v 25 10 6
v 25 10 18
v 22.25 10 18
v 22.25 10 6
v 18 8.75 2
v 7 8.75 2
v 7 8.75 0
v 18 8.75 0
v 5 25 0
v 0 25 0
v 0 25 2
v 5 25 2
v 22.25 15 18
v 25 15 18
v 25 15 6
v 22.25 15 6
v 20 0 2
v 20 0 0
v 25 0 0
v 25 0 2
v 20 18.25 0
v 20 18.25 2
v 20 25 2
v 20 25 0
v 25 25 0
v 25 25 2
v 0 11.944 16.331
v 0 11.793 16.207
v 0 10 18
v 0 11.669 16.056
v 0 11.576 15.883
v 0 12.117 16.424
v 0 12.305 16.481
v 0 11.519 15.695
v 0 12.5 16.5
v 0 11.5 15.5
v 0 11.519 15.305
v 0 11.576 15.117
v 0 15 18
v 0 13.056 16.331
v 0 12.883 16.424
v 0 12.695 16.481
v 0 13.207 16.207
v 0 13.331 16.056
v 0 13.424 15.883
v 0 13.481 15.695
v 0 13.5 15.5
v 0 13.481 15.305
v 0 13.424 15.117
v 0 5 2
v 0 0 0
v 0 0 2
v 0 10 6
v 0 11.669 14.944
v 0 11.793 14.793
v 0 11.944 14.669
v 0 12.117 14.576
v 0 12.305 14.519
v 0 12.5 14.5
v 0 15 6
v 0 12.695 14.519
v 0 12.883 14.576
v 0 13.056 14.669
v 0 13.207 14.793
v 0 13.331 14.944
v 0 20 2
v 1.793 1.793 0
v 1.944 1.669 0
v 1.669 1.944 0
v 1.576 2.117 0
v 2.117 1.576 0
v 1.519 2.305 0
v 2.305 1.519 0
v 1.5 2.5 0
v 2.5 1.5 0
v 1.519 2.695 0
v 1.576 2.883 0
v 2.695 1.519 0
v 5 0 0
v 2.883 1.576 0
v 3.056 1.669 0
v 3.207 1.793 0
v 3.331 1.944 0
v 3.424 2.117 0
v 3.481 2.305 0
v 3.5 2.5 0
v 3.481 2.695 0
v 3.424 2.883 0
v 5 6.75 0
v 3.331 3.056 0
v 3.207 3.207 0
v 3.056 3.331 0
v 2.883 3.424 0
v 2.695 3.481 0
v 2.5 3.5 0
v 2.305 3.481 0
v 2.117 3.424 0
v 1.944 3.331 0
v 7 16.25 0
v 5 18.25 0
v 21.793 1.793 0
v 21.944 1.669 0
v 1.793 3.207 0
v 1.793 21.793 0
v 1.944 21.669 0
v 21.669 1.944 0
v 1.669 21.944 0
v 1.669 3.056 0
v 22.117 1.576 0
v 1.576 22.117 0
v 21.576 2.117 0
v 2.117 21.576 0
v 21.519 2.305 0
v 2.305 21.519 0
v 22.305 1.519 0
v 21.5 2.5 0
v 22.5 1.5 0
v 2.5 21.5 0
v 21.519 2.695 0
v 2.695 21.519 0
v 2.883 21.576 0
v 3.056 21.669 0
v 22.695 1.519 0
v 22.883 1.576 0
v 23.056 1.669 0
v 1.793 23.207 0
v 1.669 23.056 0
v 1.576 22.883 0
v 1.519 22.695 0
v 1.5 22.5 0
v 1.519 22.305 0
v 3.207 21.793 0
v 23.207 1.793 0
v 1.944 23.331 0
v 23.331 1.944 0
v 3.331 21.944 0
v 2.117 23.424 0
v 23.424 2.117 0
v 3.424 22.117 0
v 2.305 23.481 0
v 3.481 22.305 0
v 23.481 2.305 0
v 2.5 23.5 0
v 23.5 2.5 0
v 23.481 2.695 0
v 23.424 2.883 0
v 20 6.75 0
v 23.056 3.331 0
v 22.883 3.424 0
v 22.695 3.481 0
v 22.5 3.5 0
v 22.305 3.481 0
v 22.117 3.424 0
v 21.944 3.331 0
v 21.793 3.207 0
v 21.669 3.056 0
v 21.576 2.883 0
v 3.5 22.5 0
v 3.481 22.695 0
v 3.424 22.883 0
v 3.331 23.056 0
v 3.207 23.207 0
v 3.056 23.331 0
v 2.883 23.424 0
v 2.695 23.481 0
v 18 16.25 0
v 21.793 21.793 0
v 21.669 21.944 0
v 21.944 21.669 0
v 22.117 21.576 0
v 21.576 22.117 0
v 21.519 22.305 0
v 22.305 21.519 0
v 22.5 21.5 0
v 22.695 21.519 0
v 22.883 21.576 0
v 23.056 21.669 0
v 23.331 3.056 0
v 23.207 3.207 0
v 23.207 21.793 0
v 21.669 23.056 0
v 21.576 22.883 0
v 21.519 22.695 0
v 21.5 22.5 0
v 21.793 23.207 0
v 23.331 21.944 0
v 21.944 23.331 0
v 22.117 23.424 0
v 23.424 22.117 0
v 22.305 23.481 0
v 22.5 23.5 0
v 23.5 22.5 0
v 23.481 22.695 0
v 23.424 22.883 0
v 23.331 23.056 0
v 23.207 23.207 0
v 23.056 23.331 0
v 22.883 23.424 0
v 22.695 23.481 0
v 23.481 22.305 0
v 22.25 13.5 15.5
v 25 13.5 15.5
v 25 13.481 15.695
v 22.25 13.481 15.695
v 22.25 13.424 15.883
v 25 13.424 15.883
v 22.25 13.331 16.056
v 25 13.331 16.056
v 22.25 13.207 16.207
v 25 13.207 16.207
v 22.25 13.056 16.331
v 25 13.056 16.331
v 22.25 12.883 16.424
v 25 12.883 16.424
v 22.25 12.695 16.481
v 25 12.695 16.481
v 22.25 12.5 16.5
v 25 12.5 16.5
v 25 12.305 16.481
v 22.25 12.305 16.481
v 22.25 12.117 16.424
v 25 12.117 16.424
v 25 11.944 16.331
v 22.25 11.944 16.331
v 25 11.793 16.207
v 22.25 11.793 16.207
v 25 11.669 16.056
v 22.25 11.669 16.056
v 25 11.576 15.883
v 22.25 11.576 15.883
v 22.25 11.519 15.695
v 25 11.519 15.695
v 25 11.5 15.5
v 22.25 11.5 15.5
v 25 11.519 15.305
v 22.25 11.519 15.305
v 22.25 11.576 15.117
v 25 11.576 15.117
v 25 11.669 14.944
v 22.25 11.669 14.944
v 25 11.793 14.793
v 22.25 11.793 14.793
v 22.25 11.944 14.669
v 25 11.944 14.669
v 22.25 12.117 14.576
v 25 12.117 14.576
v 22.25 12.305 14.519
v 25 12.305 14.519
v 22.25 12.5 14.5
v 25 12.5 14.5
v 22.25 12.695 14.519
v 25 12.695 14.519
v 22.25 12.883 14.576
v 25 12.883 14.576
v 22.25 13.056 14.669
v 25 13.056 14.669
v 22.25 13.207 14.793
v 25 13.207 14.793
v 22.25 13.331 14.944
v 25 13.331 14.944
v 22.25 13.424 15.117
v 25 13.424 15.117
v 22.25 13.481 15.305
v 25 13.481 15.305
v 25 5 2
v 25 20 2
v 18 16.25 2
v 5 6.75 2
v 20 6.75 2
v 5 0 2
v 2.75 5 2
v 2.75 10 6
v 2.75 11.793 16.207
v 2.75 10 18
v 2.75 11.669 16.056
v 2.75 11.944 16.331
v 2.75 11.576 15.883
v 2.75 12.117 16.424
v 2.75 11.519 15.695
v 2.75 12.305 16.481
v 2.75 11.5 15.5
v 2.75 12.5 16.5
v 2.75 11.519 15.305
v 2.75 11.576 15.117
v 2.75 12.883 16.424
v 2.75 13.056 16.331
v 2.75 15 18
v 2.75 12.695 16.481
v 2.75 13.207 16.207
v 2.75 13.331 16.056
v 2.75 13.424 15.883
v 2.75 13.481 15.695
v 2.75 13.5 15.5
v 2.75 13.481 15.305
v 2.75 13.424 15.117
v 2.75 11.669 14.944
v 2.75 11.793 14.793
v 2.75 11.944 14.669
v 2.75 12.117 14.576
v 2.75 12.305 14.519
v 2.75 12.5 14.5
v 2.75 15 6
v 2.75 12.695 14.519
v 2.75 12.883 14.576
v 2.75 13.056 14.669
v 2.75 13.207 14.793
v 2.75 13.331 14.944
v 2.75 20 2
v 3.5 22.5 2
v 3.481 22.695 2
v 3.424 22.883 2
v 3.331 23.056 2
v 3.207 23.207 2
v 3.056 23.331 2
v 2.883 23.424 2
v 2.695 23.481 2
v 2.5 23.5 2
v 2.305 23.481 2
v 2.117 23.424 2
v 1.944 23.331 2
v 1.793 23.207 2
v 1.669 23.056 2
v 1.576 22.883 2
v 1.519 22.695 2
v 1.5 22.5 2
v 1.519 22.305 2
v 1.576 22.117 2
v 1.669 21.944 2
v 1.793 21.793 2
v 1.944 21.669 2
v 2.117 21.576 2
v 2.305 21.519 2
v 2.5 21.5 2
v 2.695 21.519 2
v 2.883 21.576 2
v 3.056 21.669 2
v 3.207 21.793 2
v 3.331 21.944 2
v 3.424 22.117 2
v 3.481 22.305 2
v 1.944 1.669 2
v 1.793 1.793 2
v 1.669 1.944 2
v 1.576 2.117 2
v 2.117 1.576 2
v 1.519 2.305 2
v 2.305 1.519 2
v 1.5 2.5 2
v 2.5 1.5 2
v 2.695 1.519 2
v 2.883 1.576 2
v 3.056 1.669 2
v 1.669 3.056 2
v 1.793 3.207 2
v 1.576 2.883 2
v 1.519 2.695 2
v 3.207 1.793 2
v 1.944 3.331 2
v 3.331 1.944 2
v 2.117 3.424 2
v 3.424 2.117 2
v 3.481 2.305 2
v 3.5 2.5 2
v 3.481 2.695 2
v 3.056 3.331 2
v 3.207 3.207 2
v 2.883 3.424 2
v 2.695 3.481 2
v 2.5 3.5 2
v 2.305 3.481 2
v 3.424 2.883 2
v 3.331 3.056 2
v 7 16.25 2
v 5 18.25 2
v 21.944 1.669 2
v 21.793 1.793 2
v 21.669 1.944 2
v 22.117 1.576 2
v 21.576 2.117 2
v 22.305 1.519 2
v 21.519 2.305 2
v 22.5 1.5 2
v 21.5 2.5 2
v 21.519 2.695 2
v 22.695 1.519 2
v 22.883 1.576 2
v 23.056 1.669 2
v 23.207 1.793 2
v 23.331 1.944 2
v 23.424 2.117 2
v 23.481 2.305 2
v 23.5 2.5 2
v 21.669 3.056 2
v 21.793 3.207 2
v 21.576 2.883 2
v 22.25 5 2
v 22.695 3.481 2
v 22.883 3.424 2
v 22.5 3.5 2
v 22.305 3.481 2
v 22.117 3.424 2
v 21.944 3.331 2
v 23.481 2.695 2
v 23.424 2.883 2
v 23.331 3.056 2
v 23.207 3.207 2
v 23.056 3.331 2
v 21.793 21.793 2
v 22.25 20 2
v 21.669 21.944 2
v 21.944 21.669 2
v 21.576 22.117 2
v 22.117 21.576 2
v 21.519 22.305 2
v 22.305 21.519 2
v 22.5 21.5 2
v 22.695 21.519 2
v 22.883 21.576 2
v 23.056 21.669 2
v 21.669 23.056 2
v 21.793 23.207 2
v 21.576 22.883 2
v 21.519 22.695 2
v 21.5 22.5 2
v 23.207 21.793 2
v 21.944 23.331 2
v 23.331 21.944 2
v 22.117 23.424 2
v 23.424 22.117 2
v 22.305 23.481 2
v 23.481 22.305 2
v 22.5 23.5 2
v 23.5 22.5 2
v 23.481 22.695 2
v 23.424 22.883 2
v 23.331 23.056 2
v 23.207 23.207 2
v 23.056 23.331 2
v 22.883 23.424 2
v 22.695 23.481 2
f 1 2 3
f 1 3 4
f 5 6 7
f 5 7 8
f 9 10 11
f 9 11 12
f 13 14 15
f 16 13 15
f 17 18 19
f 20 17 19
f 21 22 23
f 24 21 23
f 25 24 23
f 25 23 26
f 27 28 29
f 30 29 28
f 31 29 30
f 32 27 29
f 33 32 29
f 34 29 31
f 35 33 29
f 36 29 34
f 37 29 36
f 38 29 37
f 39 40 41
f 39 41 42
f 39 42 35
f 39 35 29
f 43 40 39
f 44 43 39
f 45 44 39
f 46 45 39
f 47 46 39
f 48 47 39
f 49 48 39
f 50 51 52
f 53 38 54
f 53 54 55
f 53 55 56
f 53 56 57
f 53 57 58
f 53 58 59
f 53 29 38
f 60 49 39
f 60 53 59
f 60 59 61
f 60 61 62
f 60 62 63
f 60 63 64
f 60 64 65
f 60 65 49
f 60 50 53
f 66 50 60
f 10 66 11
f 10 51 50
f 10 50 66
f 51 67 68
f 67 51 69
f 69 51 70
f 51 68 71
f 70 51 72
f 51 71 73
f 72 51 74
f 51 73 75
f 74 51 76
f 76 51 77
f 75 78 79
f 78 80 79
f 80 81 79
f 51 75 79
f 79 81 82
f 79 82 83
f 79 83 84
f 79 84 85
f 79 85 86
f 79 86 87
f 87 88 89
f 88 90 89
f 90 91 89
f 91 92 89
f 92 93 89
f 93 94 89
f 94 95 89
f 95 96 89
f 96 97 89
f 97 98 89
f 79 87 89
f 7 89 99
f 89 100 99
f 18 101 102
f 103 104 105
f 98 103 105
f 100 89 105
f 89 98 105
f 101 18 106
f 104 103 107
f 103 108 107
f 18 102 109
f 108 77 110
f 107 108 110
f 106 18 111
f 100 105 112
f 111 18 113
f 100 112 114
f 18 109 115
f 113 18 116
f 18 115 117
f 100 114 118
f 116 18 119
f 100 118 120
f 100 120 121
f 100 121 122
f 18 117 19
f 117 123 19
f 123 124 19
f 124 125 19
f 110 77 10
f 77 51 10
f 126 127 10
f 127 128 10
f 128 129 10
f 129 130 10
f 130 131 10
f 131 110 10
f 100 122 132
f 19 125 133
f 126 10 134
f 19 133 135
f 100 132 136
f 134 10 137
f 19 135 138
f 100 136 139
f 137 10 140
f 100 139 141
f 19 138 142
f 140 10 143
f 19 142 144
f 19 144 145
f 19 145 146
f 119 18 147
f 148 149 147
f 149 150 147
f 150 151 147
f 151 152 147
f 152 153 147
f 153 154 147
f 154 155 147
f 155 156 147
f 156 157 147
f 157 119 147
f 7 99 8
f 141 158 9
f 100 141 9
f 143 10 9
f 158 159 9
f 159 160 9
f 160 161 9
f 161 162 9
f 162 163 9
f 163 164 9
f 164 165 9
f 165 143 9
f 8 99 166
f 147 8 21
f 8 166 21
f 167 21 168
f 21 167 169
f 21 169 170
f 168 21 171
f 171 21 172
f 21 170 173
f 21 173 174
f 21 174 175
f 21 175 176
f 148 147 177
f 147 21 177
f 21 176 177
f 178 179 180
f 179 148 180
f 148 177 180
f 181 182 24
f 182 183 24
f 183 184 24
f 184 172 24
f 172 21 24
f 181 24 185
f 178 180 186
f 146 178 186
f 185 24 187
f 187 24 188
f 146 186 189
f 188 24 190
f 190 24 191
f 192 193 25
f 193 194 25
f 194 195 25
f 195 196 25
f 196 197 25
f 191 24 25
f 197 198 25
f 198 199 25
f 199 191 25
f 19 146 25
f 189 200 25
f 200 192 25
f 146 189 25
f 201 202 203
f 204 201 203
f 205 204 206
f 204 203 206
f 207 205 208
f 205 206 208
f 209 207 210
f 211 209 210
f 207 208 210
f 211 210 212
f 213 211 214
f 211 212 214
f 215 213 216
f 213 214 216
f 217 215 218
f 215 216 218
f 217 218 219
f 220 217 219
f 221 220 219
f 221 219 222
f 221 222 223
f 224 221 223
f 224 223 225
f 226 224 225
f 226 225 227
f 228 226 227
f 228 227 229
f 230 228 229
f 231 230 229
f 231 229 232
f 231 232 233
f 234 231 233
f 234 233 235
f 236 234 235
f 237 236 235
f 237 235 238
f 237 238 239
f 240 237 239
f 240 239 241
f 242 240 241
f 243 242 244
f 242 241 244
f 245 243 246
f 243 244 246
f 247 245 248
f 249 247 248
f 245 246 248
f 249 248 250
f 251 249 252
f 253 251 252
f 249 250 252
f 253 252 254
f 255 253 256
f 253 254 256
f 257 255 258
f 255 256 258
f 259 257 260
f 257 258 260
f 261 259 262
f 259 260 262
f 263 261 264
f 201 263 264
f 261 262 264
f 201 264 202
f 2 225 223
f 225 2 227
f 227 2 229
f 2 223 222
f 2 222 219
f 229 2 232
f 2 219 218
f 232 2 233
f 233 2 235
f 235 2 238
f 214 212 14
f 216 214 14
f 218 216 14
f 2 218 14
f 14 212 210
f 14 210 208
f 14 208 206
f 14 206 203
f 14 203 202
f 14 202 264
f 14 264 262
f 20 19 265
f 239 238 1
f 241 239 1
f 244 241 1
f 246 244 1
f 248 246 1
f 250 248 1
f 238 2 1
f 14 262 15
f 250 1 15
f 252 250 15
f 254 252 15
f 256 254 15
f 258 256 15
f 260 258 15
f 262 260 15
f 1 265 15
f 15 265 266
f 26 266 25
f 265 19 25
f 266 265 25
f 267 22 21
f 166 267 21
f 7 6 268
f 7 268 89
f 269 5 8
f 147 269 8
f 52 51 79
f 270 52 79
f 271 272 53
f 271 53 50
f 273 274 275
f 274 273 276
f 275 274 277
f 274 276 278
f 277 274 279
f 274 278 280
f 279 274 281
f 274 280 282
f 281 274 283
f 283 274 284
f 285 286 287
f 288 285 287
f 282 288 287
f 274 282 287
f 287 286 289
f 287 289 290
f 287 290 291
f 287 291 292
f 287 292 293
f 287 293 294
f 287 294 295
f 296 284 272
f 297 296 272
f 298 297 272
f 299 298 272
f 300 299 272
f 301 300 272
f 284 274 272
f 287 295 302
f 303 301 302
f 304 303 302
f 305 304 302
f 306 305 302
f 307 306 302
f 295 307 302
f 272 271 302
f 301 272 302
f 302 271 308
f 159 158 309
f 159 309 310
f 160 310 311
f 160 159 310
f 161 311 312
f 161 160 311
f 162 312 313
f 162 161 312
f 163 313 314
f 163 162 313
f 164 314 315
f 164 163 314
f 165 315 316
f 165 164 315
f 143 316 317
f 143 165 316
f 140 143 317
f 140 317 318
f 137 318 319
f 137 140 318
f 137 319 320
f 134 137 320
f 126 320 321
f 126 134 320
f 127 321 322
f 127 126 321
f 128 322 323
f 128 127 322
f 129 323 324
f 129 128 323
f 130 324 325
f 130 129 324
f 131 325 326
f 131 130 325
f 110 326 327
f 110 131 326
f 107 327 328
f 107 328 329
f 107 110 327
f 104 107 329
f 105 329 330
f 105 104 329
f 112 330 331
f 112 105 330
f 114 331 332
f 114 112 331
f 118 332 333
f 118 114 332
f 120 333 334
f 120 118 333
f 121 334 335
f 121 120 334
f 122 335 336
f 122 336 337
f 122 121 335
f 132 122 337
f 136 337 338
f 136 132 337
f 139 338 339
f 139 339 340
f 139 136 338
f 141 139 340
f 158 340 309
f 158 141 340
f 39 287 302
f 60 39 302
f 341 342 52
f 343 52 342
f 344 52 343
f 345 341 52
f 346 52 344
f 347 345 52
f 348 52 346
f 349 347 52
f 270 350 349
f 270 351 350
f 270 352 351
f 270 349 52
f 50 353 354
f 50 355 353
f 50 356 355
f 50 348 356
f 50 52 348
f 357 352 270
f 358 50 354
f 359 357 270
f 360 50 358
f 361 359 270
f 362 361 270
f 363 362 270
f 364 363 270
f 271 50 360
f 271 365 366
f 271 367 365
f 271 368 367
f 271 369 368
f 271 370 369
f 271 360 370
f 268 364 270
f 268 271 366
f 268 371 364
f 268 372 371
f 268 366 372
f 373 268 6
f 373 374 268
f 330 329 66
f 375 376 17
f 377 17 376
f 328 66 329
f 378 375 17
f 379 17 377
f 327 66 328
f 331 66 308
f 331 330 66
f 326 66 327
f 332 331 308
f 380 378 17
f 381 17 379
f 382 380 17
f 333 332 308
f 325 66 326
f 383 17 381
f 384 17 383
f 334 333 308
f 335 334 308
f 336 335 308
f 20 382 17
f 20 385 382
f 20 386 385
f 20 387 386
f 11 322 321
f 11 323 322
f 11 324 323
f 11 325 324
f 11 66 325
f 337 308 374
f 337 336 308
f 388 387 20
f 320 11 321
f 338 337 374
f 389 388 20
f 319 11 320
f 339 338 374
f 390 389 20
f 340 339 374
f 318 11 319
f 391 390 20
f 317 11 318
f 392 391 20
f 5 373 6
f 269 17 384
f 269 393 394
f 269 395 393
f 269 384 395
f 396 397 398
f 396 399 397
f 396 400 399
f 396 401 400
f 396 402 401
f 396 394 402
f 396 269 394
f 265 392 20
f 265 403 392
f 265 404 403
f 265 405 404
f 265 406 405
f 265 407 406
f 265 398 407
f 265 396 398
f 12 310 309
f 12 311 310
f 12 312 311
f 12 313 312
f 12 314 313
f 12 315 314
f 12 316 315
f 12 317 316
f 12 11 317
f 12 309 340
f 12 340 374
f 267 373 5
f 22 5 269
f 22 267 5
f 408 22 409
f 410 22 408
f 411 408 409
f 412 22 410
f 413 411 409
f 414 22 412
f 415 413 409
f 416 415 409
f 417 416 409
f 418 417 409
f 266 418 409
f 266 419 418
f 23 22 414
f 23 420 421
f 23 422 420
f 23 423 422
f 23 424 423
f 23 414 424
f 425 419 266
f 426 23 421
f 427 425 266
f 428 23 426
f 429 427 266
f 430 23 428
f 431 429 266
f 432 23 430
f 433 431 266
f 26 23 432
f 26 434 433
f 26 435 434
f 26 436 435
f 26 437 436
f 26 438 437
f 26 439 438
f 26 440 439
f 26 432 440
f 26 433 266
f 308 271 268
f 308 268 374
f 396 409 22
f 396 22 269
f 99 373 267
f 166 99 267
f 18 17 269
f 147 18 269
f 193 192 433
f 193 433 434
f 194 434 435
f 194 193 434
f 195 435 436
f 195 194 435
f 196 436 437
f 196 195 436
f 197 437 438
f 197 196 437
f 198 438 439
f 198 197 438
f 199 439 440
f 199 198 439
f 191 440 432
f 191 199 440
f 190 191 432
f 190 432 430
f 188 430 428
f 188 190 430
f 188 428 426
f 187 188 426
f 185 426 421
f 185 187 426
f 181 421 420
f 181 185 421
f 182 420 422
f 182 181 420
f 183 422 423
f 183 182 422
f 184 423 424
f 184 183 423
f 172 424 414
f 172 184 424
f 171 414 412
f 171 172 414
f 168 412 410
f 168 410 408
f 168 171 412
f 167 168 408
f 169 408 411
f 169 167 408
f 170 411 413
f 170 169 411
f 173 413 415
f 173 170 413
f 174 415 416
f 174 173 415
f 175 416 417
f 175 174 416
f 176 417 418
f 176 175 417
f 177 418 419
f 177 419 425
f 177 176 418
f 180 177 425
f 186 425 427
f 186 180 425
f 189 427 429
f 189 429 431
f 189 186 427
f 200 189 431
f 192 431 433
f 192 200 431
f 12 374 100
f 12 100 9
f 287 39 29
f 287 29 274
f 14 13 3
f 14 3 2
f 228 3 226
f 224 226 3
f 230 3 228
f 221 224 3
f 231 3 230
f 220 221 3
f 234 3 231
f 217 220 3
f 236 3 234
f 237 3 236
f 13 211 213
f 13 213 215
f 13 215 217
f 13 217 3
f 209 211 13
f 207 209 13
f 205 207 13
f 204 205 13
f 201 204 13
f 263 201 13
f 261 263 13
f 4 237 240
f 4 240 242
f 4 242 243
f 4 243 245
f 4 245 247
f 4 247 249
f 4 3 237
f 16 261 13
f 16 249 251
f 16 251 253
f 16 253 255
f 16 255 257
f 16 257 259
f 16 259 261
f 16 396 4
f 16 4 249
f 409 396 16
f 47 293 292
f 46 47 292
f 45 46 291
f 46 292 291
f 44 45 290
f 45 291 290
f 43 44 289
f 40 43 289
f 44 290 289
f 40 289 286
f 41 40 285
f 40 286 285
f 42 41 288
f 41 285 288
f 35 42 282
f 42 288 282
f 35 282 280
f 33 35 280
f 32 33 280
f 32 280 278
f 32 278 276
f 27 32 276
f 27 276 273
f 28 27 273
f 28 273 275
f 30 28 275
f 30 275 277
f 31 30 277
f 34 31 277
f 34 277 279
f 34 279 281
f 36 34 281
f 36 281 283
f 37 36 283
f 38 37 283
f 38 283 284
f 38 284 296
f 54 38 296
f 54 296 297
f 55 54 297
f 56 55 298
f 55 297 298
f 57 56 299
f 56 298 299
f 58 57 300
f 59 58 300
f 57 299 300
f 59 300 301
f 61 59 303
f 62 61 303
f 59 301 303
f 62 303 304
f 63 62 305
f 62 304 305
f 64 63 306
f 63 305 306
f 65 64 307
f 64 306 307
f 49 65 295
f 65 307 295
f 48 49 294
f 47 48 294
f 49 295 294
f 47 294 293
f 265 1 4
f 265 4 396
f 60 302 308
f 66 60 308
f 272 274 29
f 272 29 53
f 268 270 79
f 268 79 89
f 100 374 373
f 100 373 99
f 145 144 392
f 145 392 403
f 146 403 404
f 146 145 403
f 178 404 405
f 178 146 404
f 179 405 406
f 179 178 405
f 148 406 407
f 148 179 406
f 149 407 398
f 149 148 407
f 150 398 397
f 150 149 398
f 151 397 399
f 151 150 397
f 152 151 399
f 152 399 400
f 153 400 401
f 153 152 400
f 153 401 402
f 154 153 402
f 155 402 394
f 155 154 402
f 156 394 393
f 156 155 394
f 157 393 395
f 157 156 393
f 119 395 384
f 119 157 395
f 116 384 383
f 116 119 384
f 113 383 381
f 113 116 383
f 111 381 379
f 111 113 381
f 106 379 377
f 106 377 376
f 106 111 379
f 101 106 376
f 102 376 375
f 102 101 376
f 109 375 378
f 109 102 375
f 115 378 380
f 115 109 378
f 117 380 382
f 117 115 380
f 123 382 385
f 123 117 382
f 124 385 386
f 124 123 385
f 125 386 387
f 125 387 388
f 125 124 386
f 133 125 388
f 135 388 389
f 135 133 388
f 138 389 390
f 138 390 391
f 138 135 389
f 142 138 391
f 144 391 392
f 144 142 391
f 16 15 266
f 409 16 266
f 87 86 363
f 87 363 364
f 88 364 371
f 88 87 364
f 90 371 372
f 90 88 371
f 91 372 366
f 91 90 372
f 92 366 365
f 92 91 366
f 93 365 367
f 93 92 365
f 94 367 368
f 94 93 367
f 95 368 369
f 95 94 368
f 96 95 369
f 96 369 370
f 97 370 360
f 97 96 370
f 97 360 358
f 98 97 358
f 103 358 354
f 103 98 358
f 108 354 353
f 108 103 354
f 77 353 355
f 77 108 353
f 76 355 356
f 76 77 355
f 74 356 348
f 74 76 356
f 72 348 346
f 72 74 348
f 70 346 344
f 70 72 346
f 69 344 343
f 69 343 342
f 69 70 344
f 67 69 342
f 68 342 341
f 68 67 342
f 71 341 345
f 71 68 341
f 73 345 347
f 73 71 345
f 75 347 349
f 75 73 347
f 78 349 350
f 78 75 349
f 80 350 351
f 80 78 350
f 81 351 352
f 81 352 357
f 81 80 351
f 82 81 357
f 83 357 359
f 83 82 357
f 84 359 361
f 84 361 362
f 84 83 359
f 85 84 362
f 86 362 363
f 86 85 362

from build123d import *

# Parameters (mm, degrees)
SKETCH_W        = 25
SKETCH_H        = 25
SKETCH_R        = 1
PAD_DEPTH       = 2
SKETCH001_W     = 2.75
SKETCH001_H     = 15
PAD001_DEPTH    = 16
SKETCH002_W     = 15
SKETCH002_H     = 8.75
POCKET_DEPTH    = 100
CHAMFER_SIZE    = 2
SKETCH003_R     = 1
POCKET001_DEPTH = 100
POCKET002_DEPTH = 100


with BuildPart() as part:
    # Sketch → Pad (new body)
    with BuildSketch(Plane.XY):
        with Locations((12.5, 12.5)):
            Rectangle(SKETCH_W, SKETCH_H)
        with Locations((2.5, 22.5)):
            Circle(SKETCH_R, mode=Mode.SUBTRACT)
        with Locations((22.5, 22.5)):
            Circle(SKETCH_R, mode=Mode.SUBTRACT)
        with Locations((22.5, 2.5)):
            Circle(SKETCH_R, mode=Mode.SUBTRACT)
        with Locations((2.5, 2.5)):
            Circle(SKETCH_R, mode=Mode.SUBTRACT)
    extrude(amount=PAD_DEPTH)

    # Sketch001 (on Face10 of Pad) → Pad001 (join)
    with BuildSketch(Plane.XY.offset(2)):
        with Locations((1.375, 12.5)):
            Rectangle(SKETCH001_W, SKETCH001_H)
        with Locations((23.625, 12.5)):
            Rectangle(SKETCH001_W, SKETCH001_H)
    extrude(amount=PAD001_DEPTH)

    # Sketch002 (on Face5 of Pad001) → Pocket (cut)
    with BuildSketch(Plane.XY.offset(2)):
        with Locations((12.5, 20.625)):
            Rectangle(SKETCH002_W, SKETCH002_H)
        with Locations((12.5, 4.375)):
            Rectangle(SKETCH002_W, SKETCH002_H)
    extrude(amount=-POCKET_DEPTH, mode=Mode.SUBTRACT)

    # Chamfer
    chamfer_edges = [part.edges().sort_by_distance(p)[0] for p in [
        (20, 16.25, 1),
        (5, 16.25, 1),
        (5, 8.75, 1),
        (20, 8.75, 1),
    ]]
    chamfer(chamfer_edges, length=CHAMFER_SIZE)

    # Sketch003 (on Face24 of Chamfer) → Pocket001 (cut)
    with BuildSketch(Plane.YZ.offset(25)):
        with Locations((12.5, 15.5)):
            Circle(SKETCH003_R)
    extrude(amount=-POCKET001_DEPTH, mode=Mode.SUBTRACT)

    # Sketch004 (on Face24 of Pocket001) → Pocket002 (cut)
    with BuildSketch(Plane.YZ.offset(25)):
        Polygon((10, 18), (10, 6), (5, 2), (5, 18), align=None)
        Polygon((15, 18), (15, 6), (20, 2), (20, 18), align=None)
    extrude(amount=-POCKET002_DEPTH, mode=Mode.SUBTRACT)


solid = part.part
